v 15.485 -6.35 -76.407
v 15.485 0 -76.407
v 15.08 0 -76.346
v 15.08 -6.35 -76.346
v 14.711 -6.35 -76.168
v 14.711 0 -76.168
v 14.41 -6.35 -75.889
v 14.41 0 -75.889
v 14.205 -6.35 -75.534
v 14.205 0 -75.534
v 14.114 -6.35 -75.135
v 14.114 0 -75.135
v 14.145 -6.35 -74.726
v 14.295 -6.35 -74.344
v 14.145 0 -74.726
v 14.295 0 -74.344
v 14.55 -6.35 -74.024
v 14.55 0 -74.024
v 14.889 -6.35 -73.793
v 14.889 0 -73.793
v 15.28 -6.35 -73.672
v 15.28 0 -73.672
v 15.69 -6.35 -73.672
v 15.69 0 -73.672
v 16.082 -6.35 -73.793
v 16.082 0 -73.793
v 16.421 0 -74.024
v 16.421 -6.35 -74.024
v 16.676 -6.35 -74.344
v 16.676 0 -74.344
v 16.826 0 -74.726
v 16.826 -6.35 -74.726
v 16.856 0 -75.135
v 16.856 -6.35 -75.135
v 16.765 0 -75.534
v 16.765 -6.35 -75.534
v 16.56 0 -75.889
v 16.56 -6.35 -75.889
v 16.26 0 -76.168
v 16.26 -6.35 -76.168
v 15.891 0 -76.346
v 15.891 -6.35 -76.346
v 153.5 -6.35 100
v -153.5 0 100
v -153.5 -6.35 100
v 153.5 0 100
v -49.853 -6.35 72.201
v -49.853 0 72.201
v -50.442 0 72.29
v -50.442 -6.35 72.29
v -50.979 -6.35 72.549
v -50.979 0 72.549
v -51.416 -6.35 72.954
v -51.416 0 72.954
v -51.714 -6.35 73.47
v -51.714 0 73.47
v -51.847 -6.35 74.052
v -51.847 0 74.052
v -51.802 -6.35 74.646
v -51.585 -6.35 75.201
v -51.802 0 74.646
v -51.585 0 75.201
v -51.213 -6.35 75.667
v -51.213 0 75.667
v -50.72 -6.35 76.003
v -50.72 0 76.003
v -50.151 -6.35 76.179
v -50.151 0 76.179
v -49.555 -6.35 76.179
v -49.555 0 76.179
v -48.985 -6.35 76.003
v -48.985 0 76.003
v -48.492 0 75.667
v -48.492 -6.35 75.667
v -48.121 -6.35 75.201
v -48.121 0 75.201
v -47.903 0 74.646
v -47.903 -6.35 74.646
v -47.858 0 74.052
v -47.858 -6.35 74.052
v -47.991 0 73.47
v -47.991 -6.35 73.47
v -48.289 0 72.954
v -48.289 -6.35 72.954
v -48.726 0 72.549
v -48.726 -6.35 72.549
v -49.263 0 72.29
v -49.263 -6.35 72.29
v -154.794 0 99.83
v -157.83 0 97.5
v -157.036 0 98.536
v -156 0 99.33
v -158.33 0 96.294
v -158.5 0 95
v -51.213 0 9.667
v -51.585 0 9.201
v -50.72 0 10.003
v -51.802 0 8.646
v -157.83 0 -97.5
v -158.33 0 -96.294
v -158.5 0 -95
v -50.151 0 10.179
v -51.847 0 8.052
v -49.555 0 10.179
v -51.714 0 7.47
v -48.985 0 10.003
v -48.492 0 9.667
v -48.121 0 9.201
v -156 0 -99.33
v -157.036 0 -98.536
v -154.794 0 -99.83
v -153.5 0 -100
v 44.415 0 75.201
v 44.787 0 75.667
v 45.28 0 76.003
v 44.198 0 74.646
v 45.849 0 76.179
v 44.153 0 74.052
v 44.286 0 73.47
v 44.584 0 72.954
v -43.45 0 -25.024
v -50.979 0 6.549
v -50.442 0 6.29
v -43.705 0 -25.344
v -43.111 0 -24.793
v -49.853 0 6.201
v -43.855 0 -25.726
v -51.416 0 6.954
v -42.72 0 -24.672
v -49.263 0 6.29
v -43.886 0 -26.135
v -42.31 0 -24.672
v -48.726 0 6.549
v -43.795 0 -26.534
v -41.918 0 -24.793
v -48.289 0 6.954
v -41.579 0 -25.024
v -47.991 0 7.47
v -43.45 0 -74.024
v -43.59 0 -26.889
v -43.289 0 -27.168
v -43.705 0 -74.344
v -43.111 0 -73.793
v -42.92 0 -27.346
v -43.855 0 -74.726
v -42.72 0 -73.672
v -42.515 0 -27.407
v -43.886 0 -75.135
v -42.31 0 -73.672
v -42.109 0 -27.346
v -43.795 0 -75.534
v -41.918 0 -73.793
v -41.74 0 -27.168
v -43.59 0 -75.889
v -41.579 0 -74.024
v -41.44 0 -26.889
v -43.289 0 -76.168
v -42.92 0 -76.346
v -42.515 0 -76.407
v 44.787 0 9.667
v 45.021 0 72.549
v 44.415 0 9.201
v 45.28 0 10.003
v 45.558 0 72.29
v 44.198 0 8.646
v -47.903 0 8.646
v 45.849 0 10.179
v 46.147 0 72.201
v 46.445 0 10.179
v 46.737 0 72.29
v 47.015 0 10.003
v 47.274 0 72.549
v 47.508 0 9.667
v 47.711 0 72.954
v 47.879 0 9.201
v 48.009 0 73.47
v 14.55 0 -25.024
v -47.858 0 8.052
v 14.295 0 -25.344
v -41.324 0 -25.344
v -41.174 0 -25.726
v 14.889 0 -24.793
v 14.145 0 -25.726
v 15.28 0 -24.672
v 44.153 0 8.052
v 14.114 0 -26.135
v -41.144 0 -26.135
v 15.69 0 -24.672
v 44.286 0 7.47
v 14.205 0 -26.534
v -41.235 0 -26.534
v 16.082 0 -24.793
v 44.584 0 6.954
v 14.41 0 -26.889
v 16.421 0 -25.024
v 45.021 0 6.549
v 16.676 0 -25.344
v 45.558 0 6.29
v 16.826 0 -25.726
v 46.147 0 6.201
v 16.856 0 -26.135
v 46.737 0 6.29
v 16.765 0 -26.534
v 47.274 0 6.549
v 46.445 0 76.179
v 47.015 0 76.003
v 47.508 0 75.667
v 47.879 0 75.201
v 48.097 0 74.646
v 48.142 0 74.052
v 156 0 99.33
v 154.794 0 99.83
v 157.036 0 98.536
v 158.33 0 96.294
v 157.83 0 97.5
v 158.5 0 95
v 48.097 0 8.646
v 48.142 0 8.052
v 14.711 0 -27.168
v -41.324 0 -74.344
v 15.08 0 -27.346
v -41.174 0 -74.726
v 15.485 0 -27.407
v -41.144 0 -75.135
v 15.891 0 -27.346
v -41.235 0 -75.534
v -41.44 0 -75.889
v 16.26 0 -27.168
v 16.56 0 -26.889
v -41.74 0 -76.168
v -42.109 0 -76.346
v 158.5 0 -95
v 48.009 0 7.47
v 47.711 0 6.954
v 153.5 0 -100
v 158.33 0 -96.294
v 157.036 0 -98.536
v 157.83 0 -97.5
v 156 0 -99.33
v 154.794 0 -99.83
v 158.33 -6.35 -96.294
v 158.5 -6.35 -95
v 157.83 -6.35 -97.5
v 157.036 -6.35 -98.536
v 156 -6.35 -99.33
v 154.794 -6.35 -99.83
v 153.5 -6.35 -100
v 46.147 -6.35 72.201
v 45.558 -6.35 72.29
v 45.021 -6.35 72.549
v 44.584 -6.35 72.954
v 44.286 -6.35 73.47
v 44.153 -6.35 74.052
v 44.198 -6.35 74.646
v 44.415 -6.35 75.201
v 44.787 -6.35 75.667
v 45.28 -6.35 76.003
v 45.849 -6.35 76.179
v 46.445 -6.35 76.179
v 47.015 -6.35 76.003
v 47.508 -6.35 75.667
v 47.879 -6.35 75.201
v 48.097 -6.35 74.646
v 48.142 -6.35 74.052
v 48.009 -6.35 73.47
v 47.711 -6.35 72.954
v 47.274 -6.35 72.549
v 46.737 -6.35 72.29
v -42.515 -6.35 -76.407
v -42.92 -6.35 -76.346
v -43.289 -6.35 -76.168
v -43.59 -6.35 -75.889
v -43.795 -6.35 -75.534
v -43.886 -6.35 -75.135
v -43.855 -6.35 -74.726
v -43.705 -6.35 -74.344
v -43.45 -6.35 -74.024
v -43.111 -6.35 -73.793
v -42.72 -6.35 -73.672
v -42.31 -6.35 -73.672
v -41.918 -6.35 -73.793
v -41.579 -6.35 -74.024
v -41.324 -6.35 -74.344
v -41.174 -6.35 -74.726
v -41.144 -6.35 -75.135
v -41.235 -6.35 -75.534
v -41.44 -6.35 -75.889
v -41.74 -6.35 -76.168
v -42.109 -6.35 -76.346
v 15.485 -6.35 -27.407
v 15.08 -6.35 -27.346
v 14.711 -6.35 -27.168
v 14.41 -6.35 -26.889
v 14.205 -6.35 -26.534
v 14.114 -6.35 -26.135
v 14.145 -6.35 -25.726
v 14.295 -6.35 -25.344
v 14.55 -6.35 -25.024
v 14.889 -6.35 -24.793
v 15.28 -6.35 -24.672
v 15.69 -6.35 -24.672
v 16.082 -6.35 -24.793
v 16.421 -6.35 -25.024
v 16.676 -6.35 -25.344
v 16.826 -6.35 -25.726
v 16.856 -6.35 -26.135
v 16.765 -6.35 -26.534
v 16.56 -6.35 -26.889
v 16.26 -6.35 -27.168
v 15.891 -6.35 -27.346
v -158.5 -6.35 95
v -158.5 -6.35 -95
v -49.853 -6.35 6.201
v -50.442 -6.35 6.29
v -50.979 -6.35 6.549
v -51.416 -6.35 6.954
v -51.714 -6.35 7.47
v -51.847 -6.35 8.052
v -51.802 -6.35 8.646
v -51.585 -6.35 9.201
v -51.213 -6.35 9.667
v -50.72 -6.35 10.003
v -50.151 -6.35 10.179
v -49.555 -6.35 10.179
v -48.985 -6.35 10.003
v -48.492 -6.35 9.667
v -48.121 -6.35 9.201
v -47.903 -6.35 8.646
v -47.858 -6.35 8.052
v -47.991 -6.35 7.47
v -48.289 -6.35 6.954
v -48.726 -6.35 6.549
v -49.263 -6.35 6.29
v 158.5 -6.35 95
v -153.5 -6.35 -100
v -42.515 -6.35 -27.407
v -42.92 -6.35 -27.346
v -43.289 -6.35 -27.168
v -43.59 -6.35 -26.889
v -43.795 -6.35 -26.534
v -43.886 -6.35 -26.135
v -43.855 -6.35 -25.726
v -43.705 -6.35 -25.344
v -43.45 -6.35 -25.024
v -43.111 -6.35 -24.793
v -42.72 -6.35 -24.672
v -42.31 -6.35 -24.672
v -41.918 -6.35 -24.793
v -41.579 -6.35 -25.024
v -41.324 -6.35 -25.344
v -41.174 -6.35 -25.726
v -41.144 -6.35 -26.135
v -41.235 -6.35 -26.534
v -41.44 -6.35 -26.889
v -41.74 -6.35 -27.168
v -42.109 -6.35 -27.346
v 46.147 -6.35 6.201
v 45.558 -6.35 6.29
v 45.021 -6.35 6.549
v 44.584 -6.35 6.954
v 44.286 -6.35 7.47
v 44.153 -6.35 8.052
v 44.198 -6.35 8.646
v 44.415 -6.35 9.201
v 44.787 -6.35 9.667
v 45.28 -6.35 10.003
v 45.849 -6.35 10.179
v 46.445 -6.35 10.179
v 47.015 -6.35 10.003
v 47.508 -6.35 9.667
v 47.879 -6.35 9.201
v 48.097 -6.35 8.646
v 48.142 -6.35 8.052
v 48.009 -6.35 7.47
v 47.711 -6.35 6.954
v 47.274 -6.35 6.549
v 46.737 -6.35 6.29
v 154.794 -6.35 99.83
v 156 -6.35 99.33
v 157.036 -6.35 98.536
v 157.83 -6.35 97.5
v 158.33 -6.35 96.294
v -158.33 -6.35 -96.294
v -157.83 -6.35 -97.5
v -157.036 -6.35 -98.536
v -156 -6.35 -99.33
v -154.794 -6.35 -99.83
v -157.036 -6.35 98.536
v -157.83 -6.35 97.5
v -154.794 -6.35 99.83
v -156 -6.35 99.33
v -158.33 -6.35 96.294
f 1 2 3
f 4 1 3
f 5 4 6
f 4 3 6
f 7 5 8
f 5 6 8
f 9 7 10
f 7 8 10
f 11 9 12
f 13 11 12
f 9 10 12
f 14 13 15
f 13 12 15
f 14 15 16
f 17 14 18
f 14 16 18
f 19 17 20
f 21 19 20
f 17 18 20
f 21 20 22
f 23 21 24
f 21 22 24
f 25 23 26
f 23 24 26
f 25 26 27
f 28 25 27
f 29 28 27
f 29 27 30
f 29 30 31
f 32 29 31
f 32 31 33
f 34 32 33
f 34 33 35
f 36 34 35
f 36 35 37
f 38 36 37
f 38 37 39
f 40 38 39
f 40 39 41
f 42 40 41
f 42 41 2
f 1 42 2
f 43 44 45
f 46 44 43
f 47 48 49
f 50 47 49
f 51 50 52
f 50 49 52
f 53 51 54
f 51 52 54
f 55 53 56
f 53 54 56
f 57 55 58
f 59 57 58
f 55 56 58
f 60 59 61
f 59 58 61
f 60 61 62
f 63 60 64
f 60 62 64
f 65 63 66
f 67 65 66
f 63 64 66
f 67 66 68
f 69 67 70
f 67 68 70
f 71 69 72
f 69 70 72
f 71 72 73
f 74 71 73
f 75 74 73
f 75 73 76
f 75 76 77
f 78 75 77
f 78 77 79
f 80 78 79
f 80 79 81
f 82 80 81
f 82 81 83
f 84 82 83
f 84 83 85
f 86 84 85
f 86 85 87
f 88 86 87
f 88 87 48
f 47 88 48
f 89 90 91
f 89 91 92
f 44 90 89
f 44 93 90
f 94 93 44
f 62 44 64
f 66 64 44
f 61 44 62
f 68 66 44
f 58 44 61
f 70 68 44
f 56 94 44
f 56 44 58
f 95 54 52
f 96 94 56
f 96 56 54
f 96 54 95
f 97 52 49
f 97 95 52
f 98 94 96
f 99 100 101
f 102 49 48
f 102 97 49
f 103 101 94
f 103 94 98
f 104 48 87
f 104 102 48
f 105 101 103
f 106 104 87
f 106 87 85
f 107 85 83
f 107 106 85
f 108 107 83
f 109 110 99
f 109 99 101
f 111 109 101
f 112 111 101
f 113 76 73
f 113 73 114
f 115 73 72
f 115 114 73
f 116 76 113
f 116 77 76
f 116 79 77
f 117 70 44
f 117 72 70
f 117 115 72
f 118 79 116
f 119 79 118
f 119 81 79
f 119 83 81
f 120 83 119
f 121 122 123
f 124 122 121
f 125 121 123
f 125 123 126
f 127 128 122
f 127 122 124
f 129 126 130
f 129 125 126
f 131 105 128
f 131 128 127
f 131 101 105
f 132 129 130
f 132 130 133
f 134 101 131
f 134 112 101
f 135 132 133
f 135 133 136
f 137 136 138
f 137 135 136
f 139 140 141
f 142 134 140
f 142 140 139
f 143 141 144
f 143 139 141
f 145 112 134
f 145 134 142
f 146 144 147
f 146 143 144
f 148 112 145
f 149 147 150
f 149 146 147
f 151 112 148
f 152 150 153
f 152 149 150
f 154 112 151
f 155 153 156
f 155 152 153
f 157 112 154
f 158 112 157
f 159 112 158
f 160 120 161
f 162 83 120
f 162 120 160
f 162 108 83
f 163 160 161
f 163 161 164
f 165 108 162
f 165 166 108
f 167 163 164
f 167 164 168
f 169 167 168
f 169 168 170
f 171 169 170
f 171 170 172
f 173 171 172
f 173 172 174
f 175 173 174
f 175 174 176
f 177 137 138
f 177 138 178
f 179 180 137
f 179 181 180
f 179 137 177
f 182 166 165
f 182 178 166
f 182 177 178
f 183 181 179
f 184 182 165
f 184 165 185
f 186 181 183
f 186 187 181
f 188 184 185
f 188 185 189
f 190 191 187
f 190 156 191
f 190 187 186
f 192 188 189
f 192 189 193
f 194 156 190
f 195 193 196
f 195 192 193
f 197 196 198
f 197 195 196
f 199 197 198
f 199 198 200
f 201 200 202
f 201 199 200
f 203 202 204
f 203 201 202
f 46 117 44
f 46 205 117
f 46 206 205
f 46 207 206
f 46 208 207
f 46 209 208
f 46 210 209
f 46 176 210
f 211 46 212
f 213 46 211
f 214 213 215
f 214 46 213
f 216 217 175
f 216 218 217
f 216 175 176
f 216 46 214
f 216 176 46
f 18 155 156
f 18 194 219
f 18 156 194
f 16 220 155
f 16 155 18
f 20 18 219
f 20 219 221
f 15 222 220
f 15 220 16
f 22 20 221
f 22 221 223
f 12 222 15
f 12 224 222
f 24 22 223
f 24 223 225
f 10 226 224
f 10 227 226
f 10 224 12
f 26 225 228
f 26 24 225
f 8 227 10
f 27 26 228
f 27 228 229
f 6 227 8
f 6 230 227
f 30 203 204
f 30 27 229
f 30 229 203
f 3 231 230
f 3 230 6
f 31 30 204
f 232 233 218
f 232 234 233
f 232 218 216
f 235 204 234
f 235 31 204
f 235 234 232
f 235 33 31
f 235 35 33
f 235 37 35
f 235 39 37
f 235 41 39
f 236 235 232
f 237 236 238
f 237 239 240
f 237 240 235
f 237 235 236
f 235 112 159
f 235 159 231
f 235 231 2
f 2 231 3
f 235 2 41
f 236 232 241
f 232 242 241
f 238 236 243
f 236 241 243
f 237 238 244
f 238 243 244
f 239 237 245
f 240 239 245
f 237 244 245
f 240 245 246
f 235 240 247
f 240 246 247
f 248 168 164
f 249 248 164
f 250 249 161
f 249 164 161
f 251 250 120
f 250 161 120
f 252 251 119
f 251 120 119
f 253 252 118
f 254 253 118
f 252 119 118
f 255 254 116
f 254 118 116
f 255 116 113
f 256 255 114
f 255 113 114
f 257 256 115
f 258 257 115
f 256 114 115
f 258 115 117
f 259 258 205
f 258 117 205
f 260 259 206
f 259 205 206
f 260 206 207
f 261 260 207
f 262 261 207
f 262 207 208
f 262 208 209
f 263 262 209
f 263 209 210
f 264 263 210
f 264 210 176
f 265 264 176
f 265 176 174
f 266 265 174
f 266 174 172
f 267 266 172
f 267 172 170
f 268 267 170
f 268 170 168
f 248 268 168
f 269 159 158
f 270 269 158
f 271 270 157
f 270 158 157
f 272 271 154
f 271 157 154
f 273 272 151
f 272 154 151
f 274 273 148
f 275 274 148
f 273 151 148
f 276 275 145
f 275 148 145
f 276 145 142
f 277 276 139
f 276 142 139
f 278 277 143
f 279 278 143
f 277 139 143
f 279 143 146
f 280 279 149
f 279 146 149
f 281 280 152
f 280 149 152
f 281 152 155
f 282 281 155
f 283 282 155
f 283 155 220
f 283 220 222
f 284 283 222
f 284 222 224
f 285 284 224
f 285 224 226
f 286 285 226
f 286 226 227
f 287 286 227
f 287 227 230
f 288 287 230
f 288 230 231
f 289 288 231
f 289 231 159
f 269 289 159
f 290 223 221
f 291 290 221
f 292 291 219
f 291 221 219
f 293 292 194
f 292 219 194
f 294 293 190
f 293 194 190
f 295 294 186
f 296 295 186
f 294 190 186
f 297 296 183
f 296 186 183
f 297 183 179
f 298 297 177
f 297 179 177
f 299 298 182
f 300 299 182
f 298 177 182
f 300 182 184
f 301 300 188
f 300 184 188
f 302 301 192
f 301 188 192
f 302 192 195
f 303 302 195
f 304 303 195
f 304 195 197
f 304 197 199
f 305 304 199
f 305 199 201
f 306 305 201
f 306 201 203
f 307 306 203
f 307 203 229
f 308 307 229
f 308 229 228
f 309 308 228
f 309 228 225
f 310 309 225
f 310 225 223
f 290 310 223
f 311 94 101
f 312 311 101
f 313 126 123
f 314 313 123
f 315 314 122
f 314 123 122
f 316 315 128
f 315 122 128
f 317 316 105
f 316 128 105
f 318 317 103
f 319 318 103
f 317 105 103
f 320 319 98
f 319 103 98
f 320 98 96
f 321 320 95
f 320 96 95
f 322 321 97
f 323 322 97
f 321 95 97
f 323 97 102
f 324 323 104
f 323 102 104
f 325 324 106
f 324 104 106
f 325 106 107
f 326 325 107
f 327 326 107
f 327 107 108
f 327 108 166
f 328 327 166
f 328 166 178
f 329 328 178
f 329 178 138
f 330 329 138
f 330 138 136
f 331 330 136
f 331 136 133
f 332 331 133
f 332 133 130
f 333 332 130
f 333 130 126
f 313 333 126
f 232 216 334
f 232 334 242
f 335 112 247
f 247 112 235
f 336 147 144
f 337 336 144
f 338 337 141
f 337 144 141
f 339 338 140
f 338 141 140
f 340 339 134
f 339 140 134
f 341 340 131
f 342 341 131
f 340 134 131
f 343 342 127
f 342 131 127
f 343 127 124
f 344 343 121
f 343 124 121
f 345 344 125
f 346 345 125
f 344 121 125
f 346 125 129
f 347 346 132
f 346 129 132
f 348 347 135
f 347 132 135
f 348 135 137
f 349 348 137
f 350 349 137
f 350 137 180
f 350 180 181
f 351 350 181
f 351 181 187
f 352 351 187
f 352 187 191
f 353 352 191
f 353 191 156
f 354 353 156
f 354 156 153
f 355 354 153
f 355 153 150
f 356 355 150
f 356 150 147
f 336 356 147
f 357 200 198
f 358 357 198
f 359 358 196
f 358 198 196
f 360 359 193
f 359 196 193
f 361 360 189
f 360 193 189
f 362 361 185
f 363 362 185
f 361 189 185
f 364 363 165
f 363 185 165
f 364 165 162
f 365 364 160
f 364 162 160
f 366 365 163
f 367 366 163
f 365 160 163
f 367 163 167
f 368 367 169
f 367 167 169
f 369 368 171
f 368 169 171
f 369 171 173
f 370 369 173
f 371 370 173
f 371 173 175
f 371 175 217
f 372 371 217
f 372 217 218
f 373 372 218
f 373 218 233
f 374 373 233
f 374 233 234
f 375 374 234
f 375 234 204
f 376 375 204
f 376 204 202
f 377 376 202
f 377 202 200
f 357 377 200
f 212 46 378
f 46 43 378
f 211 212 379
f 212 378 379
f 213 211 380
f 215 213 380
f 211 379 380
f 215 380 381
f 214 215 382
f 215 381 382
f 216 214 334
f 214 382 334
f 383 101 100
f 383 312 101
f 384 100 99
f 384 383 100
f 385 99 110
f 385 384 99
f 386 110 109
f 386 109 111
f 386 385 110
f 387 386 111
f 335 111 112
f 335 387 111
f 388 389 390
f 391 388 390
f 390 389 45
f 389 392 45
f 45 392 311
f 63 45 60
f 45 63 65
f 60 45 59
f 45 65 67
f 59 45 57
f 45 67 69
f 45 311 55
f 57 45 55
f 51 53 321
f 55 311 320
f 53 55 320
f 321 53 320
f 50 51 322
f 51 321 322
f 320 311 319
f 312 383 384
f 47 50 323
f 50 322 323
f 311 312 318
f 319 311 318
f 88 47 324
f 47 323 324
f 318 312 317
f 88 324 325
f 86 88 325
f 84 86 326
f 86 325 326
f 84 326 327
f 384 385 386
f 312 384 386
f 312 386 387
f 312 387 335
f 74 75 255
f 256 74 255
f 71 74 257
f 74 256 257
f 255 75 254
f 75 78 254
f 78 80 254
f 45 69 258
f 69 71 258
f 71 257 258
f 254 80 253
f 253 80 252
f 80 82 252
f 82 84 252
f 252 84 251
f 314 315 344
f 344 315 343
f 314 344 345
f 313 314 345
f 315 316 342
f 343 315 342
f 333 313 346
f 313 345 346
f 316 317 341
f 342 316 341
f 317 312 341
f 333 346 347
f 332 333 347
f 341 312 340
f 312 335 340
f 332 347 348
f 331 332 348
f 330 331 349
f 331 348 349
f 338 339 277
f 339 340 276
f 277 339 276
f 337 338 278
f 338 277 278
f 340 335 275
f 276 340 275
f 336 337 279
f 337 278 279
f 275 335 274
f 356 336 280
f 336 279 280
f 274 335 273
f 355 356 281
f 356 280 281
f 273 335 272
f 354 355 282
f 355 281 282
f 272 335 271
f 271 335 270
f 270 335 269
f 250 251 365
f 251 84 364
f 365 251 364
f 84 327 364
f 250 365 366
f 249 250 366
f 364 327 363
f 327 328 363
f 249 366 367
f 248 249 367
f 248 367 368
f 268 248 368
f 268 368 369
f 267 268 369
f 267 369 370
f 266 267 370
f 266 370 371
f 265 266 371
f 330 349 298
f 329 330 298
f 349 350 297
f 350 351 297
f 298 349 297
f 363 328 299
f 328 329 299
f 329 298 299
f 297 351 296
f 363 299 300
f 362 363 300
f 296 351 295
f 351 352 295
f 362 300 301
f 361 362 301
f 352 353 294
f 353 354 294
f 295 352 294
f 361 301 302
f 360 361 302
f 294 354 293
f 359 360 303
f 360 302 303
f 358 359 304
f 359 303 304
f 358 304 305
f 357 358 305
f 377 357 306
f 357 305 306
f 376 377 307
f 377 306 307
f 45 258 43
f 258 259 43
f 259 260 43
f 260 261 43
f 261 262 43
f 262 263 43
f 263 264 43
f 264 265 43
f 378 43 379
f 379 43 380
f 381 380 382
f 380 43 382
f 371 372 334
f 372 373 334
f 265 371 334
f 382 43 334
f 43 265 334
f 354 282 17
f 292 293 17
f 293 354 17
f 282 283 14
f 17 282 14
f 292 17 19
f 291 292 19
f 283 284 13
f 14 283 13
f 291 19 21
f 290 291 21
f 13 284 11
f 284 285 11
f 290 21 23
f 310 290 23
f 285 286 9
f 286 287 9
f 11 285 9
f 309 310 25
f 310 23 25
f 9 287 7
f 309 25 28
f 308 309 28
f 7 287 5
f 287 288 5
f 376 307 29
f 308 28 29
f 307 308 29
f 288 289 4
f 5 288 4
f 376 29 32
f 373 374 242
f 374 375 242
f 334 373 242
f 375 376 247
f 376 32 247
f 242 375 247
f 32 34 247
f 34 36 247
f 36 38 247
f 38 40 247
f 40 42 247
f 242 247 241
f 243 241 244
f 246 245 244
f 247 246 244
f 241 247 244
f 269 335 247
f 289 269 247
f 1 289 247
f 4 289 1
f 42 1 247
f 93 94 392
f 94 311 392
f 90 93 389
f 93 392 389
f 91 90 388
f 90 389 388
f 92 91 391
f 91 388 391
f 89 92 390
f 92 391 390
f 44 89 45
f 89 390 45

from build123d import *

# Parameters (mm, degrees)
SKETCH1_W           = 317
SKETCH1_H           = 200
BOSS_EXTRUDE1_DEPTH = 6.35
FILLET1_R           = 5
SKETCH2_R           = 2
SKETCH2_R_2         = 1.375
CUT_EXTRUDE1_DEPTH  = 10


with BuildPart() as part:
    # Sketch1 → Boss-Extrude1 (new body)
    with BuildSketch(Plane(origin=(0, 0, 0), x_dir=(1, 0, 0), z_dir=(0, 1, 0))):
        Rectangle(SKETCH1_W, SKETCH1_H)
    extrude(amount=-BOSS_EXTRUDE1_DEPTH)

    # Fillet1
    fillet1_edges = [part.edges().sort_by_distance(p)[0] for p in [
        (-158.5, -3.175, -100),
        (158.5, -3.175, -100),
        (158.5, -3.175, 100),
        (-158.5, -3.175, 100),
    ]]
    fillet(fillet1_edges, radius=FILLET1_R)

    # Sketch2 → Cut-Extrude1 (cut)
    with BuildSketch(Plane(origin=(93.325, 0, -211.68), x_dir=(0, 0, -1), z_dir=(0, 1, 0))):
        with Locations((-219.881035079, 47.177621018)):
            Circle(SKETCH2_R)
        with Locations((-285.881035079, 47.177621018)):
            Circle(SKETCH2_R)
        with Locations((-219.881035079, 143.177621018)):
            Circle(SKETCH2_R)
        with Locations((-285.881035079, 143.177621018)):
            Circle(SKETCH2_R)
        with Locations((-136.648177626, 77.839658286)):
            Circle(SKETCH2_R_2)
        with Locations((-185.648177626, 77.839658286)):
            Circle(SKETCH2_R_2)
        with Locations((-185.648177626, 135.839658286)):
            Circle(SKETCH2_R_2)
        with Locations((-136.648177626, 135.839658286)):
            Circle(SKETCH2_R_2)
    extrude(amount=-CUT_EXTRUDE1_DEPTH, mode=Mode.SUBTRACT)


solid = part.part
